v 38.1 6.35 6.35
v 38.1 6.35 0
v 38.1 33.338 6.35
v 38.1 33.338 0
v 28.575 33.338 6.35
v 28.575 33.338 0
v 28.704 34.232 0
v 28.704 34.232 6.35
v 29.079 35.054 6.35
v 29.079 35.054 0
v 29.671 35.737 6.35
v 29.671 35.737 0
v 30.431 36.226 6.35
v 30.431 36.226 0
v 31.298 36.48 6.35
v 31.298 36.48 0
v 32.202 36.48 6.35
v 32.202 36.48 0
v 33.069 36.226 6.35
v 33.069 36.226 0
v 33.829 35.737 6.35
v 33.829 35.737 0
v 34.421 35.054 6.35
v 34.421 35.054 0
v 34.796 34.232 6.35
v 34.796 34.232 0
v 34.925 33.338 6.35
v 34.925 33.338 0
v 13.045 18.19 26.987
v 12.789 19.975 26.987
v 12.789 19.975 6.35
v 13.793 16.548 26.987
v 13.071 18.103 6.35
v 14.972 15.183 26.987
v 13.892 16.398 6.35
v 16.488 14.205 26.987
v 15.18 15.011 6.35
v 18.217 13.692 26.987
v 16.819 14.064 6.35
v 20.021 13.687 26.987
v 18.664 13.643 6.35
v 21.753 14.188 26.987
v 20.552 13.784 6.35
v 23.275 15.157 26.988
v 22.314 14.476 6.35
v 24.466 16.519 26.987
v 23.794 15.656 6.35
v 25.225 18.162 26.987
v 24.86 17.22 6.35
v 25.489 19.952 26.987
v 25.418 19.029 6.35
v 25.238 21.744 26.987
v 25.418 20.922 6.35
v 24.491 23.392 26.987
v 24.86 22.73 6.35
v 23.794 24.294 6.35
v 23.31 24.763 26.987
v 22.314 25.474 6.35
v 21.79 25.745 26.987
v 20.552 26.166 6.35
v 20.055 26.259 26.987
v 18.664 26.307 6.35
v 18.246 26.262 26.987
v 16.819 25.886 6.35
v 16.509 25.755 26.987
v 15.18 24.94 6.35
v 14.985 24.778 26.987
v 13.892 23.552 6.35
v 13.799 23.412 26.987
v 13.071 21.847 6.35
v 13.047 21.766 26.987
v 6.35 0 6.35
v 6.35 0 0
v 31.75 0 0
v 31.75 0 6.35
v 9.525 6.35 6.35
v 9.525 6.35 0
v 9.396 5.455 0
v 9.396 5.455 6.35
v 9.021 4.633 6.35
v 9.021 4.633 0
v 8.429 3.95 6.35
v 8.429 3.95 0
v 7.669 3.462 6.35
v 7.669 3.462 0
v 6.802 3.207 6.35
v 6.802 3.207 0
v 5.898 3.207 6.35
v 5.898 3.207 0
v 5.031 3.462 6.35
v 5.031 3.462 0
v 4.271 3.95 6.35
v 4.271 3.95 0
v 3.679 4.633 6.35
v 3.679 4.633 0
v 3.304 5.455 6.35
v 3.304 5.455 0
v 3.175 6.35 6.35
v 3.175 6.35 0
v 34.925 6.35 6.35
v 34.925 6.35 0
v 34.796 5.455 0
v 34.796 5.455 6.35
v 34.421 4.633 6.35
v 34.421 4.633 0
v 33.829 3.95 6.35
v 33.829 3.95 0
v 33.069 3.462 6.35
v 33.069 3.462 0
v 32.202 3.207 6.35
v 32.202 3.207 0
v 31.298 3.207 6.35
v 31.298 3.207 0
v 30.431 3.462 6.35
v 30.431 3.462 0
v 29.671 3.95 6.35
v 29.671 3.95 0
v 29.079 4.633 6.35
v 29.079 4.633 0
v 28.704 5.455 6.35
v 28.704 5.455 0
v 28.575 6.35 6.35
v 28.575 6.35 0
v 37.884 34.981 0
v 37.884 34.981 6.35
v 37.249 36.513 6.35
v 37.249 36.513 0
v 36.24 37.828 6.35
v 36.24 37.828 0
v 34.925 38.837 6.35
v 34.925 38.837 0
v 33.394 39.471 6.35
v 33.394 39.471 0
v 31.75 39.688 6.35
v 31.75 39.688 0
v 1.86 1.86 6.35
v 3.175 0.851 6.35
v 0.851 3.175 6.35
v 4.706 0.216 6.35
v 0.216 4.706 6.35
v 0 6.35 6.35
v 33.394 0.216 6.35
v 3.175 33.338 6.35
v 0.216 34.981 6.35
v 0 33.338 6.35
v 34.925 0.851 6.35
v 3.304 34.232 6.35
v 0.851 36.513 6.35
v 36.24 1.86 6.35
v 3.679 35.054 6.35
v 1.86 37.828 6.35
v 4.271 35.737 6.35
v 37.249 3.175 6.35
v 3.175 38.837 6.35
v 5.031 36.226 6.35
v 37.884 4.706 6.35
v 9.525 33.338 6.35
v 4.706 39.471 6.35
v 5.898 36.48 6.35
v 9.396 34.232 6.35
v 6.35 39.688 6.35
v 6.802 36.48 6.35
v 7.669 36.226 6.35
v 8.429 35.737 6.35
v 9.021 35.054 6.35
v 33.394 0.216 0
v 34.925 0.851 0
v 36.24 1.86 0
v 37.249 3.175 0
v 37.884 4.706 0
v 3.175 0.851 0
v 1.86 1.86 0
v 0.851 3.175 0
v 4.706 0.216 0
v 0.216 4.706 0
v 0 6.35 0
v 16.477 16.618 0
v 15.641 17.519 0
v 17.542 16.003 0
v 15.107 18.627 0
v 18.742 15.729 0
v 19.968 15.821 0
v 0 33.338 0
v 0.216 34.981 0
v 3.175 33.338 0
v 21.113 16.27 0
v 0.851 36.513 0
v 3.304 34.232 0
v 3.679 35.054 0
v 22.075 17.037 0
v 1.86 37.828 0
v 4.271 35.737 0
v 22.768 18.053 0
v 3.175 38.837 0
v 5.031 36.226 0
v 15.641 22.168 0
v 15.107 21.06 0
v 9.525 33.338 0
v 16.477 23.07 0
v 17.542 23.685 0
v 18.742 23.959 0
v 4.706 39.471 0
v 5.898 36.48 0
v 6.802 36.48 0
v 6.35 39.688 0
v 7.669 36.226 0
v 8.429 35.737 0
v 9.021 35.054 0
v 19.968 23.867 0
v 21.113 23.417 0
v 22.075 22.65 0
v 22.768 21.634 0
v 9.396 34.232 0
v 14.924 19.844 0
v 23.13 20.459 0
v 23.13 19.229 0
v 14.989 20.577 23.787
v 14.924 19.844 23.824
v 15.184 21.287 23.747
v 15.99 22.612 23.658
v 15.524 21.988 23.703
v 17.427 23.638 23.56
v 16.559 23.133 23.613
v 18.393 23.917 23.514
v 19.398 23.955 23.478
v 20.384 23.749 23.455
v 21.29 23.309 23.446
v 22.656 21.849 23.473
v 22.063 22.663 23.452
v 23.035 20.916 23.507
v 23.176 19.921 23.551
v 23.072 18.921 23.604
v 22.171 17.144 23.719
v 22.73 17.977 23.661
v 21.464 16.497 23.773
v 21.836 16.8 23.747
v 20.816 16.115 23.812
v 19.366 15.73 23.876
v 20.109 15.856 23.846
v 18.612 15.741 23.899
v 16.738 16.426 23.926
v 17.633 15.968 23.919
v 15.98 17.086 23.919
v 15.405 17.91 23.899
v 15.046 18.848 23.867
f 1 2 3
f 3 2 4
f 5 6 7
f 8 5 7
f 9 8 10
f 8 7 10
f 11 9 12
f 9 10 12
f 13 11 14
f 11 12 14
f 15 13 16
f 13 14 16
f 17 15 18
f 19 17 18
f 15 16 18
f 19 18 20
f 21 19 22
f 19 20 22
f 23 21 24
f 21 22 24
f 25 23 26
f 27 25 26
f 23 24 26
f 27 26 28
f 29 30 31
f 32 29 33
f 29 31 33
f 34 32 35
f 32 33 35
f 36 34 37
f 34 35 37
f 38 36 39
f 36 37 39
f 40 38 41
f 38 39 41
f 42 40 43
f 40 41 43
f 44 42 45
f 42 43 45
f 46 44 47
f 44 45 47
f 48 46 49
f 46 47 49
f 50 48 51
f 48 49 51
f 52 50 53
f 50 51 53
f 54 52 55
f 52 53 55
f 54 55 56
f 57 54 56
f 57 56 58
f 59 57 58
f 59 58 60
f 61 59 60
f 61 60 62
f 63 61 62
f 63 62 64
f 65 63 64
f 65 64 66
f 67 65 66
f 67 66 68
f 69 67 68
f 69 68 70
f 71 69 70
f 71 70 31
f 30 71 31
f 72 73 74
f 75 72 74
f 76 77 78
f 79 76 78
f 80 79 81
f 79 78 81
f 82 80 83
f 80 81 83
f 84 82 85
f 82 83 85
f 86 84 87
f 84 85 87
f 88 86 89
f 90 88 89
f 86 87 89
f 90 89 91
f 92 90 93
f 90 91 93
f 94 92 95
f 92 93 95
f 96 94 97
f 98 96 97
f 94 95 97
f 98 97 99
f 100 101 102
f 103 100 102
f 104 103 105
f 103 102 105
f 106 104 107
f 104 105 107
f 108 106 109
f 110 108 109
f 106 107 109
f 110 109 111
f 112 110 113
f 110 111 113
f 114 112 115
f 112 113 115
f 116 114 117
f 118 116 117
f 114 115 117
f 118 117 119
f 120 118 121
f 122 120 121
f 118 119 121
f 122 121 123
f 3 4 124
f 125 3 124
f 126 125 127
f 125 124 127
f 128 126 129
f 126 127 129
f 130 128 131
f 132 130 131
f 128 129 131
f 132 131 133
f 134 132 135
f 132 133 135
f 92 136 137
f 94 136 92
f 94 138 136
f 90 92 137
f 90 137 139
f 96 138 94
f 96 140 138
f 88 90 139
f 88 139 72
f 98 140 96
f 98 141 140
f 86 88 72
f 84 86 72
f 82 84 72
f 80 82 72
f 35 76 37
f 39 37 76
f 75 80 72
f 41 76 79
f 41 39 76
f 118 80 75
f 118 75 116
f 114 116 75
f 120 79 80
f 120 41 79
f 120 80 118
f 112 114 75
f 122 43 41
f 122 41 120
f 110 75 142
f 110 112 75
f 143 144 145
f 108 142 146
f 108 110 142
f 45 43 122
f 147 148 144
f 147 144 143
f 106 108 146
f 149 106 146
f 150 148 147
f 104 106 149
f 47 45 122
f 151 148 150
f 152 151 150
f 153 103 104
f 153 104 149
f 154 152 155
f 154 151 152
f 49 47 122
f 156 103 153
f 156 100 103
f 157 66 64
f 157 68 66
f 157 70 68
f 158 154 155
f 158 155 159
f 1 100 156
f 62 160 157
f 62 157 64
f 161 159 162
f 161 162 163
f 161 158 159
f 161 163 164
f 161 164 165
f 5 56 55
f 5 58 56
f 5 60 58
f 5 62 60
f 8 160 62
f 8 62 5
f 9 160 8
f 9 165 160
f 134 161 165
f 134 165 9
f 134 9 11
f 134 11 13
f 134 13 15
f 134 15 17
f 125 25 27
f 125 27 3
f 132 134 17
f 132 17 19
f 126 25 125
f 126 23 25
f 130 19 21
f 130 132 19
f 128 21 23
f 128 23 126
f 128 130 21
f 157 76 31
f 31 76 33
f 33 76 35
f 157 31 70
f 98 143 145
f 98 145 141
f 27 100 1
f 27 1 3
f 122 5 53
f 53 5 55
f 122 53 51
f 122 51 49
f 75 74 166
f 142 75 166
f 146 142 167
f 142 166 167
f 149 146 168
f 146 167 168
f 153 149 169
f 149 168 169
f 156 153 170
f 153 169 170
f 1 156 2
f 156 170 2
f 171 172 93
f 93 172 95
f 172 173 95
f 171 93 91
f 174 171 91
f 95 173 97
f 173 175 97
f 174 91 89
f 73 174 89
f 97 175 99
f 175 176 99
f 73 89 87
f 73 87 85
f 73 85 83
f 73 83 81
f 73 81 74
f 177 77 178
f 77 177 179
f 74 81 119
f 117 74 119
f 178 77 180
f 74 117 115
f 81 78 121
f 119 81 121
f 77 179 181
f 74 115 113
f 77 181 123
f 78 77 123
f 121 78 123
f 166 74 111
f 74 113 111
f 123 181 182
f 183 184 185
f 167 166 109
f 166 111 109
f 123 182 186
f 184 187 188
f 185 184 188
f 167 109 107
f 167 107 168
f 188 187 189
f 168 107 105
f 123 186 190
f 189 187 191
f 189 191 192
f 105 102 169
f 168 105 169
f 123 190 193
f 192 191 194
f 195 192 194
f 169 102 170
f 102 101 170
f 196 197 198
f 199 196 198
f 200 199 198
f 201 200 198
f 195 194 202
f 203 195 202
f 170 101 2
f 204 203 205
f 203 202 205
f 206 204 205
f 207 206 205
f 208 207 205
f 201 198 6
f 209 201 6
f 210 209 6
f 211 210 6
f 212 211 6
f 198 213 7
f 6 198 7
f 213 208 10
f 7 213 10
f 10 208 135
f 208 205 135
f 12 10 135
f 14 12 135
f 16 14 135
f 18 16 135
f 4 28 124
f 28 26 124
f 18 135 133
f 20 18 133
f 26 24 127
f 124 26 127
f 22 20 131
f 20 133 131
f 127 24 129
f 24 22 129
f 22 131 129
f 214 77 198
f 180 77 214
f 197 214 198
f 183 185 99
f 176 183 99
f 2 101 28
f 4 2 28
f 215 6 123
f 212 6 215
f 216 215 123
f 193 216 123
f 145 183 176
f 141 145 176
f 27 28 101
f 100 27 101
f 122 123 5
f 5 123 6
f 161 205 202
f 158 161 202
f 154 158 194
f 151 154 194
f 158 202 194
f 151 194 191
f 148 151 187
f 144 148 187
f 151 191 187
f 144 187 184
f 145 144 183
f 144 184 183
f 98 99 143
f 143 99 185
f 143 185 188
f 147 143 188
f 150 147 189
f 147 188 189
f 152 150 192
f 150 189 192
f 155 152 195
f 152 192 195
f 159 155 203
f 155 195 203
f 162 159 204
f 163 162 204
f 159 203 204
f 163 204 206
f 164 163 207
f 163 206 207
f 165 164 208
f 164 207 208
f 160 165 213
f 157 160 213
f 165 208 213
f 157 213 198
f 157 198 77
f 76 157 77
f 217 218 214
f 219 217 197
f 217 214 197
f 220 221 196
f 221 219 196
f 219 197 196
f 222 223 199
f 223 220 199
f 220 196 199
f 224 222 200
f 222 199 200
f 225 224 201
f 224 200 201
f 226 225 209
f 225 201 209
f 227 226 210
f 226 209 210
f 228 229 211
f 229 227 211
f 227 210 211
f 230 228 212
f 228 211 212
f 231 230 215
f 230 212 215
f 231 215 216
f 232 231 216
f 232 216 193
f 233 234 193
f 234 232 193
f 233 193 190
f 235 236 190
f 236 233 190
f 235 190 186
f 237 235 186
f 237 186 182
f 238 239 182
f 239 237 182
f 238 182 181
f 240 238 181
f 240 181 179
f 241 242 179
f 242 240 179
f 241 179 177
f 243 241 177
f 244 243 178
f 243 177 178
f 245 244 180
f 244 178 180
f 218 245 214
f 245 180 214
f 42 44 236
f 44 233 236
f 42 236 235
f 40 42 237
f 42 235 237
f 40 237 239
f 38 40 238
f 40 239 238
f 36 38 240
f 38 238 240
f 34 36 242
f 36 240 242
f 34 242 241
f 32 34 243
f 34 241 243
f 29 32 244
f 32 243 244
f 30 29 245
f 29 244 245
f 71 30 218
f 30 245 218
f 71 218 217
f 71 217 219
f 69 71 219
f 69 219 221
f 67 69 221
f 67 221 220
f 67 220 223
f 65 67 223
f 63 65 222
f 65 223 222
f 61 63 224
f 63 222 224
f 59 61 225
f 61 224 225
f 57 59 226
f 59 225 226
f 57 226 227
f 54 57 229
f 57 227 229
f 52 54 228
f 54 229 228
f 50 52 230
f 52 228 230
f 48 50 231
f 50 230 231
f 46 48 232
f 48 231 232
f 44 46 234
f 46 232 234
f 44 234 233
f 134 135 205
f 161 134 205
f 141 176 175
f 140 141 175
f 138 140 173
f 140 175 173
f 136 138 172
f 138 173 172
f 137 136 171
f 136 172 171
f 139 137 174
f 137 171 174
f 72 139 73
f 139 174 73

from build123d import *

# Parameters (mm, degrees)
BOSS_EXTRUDE1_DEPTH = 6.35
SKETCH3_R           = 6.35
BOSS_EXTRUDE2_DEPTH = 20.6375
SKETCH5_R           = 4.126342011
CUT_EXTRUDE2_DEPTH  = 62.278322577


with BuildPart() as part:
    # Sketch2 → Boss-Extrude1 (new body)
    with BuildSketch(Plane.XY):
        with BuildLine():
            Line((6.35, 0), (31.75, 0))
            ThreePointArc((31.75, 0), (36.240128061, 1.859871939), (38.1, 6.35))
            Line((38.1, 6.35), (38.1, 33.3375))
            ThreePointArc((38.1, 33.3375), (36.240128061, 37.827628061), (31.75, 39.6875))
            Line((31.75, 39.6875), (6.35, 39.6875))
            ThreePointArc((6.35, 39.6875), (1.859871939, 37.827628061), (0, 33.3375))
            Line((0, 33.3375), (0, 6.35))
            ThreePointArc((0, 6.35), (1.859871939, 1.859871939), (6.35, 0))
        make_face()
        with BuildLine():
            Line((9.525, 33.3375), (9.525, 6.35))
            ThreePointArc((9.525, 6.35), (6.35, 3.175), (3.175, 6.35))
            Line((3.175, 6.35), (3.175, 33.3375))
            ThreePointArc((3.175, 33.3375), (6.35, 36.5125), (9.525, 33.3375))
        make_face(mode=Mode.SUBTRACT)
        with BuildLine():
            Line((34.925, 33.3375), (34.925, 6.35))
            ThreePointArc((34.925, 6.35), (31.75, 3.175), (28.575, 6.35))
            Line((28.575, 6.35), (28.575, 33.3375))
            ThreePointArc((28.575, 33.3375), (31.75, 36.5125), (34.925, 33.3375))
        make_face(mode=Mode.SUBTRACT)
    extrude(amount=BOSS_EXTRUDE1_DEPTH)

    # Sketch3 → Boss-Extrude2 (add)
    with BuildSketch(Plane.XY.offset(6.35)):
        with Locations(Location((19.138936621, 19.975145899, 0), (0, 0, 180))):
            Circle(SKETCH3_R)
    extrude(amount=BOSS_EXTRUDE2_DEPTH)

    # Cut-Loft1: read off the stored shape, not the designer's step
    # Cut-Loft1: loft between two sections, ruled curve by curve
    cut_loft1_from = [
        Edge.make_bspline([(23.27505423, 15.156947986, 26.9875), (13.638658406, 6.884712768, 26.9875), (5.366423187, 16.521108592, 26.9875), (15.002819012, 24.793343811, 26.9875), (24.639214837, 33.065579029, 26.9875), (32.911450055, 23.429183205, 26.9875), (23.27505423, 15.156947986, 26.9875)], [0, 0, 0, 0, 0.5, 0.5, 0.5, 1, 1, 1, 1], 3, [1, 0.333333333, 0.333333333, 1, 0.333333333, 0.333333333, 1]),
    ]
    cut_loft1_to = [
        Edge.make_bspline([(21.665907522, 18.052896418, 22.225), (17.82140856, 12.998954616, 22.225), (12.767466759, 16.843453578, 22.225), (16.611965721, 21.89739538, 22.225), (20.456464682, 26.951337181, 22.225), (25.510406484, 23.106838219, 22.225), (21.665907522, 18.052896418, 22.225)], [0, 0, 0, 0, 0.5, 0.5, 0.5, 1, 1, 1, 1], 3, [1, 0.333333333, 0.333333333, 1, 0.333333333, 0.333333333, 1]),
    ]
    cut_loft1 = Solid(Shell([*[Face.make_surface_from_curves(cut_loft1_from[k], cut_loft1_to[k]) for k in range(1)], Face(Wire(cut_loft1_from)), Face(Wire(cut_loft1_to))]))
    add(cut_loft1, mode=Mode.SUBTRACT)

    # Sketch5 → Cut-Extrude2 (cut, through all)
    with BuildSketch(Plane(origin=(0, 0, 0), x_dir=(-1, 0, 0), z_dir=(0, 0, -1))):
        with Locations((-19.05, 19.84375)):
            Circle(SKETCH5_R)
    extrude(amount=-CUT_EXTRUDE2_DEPTH, mode=Mode.SUBTRACT)


solid = part.part
